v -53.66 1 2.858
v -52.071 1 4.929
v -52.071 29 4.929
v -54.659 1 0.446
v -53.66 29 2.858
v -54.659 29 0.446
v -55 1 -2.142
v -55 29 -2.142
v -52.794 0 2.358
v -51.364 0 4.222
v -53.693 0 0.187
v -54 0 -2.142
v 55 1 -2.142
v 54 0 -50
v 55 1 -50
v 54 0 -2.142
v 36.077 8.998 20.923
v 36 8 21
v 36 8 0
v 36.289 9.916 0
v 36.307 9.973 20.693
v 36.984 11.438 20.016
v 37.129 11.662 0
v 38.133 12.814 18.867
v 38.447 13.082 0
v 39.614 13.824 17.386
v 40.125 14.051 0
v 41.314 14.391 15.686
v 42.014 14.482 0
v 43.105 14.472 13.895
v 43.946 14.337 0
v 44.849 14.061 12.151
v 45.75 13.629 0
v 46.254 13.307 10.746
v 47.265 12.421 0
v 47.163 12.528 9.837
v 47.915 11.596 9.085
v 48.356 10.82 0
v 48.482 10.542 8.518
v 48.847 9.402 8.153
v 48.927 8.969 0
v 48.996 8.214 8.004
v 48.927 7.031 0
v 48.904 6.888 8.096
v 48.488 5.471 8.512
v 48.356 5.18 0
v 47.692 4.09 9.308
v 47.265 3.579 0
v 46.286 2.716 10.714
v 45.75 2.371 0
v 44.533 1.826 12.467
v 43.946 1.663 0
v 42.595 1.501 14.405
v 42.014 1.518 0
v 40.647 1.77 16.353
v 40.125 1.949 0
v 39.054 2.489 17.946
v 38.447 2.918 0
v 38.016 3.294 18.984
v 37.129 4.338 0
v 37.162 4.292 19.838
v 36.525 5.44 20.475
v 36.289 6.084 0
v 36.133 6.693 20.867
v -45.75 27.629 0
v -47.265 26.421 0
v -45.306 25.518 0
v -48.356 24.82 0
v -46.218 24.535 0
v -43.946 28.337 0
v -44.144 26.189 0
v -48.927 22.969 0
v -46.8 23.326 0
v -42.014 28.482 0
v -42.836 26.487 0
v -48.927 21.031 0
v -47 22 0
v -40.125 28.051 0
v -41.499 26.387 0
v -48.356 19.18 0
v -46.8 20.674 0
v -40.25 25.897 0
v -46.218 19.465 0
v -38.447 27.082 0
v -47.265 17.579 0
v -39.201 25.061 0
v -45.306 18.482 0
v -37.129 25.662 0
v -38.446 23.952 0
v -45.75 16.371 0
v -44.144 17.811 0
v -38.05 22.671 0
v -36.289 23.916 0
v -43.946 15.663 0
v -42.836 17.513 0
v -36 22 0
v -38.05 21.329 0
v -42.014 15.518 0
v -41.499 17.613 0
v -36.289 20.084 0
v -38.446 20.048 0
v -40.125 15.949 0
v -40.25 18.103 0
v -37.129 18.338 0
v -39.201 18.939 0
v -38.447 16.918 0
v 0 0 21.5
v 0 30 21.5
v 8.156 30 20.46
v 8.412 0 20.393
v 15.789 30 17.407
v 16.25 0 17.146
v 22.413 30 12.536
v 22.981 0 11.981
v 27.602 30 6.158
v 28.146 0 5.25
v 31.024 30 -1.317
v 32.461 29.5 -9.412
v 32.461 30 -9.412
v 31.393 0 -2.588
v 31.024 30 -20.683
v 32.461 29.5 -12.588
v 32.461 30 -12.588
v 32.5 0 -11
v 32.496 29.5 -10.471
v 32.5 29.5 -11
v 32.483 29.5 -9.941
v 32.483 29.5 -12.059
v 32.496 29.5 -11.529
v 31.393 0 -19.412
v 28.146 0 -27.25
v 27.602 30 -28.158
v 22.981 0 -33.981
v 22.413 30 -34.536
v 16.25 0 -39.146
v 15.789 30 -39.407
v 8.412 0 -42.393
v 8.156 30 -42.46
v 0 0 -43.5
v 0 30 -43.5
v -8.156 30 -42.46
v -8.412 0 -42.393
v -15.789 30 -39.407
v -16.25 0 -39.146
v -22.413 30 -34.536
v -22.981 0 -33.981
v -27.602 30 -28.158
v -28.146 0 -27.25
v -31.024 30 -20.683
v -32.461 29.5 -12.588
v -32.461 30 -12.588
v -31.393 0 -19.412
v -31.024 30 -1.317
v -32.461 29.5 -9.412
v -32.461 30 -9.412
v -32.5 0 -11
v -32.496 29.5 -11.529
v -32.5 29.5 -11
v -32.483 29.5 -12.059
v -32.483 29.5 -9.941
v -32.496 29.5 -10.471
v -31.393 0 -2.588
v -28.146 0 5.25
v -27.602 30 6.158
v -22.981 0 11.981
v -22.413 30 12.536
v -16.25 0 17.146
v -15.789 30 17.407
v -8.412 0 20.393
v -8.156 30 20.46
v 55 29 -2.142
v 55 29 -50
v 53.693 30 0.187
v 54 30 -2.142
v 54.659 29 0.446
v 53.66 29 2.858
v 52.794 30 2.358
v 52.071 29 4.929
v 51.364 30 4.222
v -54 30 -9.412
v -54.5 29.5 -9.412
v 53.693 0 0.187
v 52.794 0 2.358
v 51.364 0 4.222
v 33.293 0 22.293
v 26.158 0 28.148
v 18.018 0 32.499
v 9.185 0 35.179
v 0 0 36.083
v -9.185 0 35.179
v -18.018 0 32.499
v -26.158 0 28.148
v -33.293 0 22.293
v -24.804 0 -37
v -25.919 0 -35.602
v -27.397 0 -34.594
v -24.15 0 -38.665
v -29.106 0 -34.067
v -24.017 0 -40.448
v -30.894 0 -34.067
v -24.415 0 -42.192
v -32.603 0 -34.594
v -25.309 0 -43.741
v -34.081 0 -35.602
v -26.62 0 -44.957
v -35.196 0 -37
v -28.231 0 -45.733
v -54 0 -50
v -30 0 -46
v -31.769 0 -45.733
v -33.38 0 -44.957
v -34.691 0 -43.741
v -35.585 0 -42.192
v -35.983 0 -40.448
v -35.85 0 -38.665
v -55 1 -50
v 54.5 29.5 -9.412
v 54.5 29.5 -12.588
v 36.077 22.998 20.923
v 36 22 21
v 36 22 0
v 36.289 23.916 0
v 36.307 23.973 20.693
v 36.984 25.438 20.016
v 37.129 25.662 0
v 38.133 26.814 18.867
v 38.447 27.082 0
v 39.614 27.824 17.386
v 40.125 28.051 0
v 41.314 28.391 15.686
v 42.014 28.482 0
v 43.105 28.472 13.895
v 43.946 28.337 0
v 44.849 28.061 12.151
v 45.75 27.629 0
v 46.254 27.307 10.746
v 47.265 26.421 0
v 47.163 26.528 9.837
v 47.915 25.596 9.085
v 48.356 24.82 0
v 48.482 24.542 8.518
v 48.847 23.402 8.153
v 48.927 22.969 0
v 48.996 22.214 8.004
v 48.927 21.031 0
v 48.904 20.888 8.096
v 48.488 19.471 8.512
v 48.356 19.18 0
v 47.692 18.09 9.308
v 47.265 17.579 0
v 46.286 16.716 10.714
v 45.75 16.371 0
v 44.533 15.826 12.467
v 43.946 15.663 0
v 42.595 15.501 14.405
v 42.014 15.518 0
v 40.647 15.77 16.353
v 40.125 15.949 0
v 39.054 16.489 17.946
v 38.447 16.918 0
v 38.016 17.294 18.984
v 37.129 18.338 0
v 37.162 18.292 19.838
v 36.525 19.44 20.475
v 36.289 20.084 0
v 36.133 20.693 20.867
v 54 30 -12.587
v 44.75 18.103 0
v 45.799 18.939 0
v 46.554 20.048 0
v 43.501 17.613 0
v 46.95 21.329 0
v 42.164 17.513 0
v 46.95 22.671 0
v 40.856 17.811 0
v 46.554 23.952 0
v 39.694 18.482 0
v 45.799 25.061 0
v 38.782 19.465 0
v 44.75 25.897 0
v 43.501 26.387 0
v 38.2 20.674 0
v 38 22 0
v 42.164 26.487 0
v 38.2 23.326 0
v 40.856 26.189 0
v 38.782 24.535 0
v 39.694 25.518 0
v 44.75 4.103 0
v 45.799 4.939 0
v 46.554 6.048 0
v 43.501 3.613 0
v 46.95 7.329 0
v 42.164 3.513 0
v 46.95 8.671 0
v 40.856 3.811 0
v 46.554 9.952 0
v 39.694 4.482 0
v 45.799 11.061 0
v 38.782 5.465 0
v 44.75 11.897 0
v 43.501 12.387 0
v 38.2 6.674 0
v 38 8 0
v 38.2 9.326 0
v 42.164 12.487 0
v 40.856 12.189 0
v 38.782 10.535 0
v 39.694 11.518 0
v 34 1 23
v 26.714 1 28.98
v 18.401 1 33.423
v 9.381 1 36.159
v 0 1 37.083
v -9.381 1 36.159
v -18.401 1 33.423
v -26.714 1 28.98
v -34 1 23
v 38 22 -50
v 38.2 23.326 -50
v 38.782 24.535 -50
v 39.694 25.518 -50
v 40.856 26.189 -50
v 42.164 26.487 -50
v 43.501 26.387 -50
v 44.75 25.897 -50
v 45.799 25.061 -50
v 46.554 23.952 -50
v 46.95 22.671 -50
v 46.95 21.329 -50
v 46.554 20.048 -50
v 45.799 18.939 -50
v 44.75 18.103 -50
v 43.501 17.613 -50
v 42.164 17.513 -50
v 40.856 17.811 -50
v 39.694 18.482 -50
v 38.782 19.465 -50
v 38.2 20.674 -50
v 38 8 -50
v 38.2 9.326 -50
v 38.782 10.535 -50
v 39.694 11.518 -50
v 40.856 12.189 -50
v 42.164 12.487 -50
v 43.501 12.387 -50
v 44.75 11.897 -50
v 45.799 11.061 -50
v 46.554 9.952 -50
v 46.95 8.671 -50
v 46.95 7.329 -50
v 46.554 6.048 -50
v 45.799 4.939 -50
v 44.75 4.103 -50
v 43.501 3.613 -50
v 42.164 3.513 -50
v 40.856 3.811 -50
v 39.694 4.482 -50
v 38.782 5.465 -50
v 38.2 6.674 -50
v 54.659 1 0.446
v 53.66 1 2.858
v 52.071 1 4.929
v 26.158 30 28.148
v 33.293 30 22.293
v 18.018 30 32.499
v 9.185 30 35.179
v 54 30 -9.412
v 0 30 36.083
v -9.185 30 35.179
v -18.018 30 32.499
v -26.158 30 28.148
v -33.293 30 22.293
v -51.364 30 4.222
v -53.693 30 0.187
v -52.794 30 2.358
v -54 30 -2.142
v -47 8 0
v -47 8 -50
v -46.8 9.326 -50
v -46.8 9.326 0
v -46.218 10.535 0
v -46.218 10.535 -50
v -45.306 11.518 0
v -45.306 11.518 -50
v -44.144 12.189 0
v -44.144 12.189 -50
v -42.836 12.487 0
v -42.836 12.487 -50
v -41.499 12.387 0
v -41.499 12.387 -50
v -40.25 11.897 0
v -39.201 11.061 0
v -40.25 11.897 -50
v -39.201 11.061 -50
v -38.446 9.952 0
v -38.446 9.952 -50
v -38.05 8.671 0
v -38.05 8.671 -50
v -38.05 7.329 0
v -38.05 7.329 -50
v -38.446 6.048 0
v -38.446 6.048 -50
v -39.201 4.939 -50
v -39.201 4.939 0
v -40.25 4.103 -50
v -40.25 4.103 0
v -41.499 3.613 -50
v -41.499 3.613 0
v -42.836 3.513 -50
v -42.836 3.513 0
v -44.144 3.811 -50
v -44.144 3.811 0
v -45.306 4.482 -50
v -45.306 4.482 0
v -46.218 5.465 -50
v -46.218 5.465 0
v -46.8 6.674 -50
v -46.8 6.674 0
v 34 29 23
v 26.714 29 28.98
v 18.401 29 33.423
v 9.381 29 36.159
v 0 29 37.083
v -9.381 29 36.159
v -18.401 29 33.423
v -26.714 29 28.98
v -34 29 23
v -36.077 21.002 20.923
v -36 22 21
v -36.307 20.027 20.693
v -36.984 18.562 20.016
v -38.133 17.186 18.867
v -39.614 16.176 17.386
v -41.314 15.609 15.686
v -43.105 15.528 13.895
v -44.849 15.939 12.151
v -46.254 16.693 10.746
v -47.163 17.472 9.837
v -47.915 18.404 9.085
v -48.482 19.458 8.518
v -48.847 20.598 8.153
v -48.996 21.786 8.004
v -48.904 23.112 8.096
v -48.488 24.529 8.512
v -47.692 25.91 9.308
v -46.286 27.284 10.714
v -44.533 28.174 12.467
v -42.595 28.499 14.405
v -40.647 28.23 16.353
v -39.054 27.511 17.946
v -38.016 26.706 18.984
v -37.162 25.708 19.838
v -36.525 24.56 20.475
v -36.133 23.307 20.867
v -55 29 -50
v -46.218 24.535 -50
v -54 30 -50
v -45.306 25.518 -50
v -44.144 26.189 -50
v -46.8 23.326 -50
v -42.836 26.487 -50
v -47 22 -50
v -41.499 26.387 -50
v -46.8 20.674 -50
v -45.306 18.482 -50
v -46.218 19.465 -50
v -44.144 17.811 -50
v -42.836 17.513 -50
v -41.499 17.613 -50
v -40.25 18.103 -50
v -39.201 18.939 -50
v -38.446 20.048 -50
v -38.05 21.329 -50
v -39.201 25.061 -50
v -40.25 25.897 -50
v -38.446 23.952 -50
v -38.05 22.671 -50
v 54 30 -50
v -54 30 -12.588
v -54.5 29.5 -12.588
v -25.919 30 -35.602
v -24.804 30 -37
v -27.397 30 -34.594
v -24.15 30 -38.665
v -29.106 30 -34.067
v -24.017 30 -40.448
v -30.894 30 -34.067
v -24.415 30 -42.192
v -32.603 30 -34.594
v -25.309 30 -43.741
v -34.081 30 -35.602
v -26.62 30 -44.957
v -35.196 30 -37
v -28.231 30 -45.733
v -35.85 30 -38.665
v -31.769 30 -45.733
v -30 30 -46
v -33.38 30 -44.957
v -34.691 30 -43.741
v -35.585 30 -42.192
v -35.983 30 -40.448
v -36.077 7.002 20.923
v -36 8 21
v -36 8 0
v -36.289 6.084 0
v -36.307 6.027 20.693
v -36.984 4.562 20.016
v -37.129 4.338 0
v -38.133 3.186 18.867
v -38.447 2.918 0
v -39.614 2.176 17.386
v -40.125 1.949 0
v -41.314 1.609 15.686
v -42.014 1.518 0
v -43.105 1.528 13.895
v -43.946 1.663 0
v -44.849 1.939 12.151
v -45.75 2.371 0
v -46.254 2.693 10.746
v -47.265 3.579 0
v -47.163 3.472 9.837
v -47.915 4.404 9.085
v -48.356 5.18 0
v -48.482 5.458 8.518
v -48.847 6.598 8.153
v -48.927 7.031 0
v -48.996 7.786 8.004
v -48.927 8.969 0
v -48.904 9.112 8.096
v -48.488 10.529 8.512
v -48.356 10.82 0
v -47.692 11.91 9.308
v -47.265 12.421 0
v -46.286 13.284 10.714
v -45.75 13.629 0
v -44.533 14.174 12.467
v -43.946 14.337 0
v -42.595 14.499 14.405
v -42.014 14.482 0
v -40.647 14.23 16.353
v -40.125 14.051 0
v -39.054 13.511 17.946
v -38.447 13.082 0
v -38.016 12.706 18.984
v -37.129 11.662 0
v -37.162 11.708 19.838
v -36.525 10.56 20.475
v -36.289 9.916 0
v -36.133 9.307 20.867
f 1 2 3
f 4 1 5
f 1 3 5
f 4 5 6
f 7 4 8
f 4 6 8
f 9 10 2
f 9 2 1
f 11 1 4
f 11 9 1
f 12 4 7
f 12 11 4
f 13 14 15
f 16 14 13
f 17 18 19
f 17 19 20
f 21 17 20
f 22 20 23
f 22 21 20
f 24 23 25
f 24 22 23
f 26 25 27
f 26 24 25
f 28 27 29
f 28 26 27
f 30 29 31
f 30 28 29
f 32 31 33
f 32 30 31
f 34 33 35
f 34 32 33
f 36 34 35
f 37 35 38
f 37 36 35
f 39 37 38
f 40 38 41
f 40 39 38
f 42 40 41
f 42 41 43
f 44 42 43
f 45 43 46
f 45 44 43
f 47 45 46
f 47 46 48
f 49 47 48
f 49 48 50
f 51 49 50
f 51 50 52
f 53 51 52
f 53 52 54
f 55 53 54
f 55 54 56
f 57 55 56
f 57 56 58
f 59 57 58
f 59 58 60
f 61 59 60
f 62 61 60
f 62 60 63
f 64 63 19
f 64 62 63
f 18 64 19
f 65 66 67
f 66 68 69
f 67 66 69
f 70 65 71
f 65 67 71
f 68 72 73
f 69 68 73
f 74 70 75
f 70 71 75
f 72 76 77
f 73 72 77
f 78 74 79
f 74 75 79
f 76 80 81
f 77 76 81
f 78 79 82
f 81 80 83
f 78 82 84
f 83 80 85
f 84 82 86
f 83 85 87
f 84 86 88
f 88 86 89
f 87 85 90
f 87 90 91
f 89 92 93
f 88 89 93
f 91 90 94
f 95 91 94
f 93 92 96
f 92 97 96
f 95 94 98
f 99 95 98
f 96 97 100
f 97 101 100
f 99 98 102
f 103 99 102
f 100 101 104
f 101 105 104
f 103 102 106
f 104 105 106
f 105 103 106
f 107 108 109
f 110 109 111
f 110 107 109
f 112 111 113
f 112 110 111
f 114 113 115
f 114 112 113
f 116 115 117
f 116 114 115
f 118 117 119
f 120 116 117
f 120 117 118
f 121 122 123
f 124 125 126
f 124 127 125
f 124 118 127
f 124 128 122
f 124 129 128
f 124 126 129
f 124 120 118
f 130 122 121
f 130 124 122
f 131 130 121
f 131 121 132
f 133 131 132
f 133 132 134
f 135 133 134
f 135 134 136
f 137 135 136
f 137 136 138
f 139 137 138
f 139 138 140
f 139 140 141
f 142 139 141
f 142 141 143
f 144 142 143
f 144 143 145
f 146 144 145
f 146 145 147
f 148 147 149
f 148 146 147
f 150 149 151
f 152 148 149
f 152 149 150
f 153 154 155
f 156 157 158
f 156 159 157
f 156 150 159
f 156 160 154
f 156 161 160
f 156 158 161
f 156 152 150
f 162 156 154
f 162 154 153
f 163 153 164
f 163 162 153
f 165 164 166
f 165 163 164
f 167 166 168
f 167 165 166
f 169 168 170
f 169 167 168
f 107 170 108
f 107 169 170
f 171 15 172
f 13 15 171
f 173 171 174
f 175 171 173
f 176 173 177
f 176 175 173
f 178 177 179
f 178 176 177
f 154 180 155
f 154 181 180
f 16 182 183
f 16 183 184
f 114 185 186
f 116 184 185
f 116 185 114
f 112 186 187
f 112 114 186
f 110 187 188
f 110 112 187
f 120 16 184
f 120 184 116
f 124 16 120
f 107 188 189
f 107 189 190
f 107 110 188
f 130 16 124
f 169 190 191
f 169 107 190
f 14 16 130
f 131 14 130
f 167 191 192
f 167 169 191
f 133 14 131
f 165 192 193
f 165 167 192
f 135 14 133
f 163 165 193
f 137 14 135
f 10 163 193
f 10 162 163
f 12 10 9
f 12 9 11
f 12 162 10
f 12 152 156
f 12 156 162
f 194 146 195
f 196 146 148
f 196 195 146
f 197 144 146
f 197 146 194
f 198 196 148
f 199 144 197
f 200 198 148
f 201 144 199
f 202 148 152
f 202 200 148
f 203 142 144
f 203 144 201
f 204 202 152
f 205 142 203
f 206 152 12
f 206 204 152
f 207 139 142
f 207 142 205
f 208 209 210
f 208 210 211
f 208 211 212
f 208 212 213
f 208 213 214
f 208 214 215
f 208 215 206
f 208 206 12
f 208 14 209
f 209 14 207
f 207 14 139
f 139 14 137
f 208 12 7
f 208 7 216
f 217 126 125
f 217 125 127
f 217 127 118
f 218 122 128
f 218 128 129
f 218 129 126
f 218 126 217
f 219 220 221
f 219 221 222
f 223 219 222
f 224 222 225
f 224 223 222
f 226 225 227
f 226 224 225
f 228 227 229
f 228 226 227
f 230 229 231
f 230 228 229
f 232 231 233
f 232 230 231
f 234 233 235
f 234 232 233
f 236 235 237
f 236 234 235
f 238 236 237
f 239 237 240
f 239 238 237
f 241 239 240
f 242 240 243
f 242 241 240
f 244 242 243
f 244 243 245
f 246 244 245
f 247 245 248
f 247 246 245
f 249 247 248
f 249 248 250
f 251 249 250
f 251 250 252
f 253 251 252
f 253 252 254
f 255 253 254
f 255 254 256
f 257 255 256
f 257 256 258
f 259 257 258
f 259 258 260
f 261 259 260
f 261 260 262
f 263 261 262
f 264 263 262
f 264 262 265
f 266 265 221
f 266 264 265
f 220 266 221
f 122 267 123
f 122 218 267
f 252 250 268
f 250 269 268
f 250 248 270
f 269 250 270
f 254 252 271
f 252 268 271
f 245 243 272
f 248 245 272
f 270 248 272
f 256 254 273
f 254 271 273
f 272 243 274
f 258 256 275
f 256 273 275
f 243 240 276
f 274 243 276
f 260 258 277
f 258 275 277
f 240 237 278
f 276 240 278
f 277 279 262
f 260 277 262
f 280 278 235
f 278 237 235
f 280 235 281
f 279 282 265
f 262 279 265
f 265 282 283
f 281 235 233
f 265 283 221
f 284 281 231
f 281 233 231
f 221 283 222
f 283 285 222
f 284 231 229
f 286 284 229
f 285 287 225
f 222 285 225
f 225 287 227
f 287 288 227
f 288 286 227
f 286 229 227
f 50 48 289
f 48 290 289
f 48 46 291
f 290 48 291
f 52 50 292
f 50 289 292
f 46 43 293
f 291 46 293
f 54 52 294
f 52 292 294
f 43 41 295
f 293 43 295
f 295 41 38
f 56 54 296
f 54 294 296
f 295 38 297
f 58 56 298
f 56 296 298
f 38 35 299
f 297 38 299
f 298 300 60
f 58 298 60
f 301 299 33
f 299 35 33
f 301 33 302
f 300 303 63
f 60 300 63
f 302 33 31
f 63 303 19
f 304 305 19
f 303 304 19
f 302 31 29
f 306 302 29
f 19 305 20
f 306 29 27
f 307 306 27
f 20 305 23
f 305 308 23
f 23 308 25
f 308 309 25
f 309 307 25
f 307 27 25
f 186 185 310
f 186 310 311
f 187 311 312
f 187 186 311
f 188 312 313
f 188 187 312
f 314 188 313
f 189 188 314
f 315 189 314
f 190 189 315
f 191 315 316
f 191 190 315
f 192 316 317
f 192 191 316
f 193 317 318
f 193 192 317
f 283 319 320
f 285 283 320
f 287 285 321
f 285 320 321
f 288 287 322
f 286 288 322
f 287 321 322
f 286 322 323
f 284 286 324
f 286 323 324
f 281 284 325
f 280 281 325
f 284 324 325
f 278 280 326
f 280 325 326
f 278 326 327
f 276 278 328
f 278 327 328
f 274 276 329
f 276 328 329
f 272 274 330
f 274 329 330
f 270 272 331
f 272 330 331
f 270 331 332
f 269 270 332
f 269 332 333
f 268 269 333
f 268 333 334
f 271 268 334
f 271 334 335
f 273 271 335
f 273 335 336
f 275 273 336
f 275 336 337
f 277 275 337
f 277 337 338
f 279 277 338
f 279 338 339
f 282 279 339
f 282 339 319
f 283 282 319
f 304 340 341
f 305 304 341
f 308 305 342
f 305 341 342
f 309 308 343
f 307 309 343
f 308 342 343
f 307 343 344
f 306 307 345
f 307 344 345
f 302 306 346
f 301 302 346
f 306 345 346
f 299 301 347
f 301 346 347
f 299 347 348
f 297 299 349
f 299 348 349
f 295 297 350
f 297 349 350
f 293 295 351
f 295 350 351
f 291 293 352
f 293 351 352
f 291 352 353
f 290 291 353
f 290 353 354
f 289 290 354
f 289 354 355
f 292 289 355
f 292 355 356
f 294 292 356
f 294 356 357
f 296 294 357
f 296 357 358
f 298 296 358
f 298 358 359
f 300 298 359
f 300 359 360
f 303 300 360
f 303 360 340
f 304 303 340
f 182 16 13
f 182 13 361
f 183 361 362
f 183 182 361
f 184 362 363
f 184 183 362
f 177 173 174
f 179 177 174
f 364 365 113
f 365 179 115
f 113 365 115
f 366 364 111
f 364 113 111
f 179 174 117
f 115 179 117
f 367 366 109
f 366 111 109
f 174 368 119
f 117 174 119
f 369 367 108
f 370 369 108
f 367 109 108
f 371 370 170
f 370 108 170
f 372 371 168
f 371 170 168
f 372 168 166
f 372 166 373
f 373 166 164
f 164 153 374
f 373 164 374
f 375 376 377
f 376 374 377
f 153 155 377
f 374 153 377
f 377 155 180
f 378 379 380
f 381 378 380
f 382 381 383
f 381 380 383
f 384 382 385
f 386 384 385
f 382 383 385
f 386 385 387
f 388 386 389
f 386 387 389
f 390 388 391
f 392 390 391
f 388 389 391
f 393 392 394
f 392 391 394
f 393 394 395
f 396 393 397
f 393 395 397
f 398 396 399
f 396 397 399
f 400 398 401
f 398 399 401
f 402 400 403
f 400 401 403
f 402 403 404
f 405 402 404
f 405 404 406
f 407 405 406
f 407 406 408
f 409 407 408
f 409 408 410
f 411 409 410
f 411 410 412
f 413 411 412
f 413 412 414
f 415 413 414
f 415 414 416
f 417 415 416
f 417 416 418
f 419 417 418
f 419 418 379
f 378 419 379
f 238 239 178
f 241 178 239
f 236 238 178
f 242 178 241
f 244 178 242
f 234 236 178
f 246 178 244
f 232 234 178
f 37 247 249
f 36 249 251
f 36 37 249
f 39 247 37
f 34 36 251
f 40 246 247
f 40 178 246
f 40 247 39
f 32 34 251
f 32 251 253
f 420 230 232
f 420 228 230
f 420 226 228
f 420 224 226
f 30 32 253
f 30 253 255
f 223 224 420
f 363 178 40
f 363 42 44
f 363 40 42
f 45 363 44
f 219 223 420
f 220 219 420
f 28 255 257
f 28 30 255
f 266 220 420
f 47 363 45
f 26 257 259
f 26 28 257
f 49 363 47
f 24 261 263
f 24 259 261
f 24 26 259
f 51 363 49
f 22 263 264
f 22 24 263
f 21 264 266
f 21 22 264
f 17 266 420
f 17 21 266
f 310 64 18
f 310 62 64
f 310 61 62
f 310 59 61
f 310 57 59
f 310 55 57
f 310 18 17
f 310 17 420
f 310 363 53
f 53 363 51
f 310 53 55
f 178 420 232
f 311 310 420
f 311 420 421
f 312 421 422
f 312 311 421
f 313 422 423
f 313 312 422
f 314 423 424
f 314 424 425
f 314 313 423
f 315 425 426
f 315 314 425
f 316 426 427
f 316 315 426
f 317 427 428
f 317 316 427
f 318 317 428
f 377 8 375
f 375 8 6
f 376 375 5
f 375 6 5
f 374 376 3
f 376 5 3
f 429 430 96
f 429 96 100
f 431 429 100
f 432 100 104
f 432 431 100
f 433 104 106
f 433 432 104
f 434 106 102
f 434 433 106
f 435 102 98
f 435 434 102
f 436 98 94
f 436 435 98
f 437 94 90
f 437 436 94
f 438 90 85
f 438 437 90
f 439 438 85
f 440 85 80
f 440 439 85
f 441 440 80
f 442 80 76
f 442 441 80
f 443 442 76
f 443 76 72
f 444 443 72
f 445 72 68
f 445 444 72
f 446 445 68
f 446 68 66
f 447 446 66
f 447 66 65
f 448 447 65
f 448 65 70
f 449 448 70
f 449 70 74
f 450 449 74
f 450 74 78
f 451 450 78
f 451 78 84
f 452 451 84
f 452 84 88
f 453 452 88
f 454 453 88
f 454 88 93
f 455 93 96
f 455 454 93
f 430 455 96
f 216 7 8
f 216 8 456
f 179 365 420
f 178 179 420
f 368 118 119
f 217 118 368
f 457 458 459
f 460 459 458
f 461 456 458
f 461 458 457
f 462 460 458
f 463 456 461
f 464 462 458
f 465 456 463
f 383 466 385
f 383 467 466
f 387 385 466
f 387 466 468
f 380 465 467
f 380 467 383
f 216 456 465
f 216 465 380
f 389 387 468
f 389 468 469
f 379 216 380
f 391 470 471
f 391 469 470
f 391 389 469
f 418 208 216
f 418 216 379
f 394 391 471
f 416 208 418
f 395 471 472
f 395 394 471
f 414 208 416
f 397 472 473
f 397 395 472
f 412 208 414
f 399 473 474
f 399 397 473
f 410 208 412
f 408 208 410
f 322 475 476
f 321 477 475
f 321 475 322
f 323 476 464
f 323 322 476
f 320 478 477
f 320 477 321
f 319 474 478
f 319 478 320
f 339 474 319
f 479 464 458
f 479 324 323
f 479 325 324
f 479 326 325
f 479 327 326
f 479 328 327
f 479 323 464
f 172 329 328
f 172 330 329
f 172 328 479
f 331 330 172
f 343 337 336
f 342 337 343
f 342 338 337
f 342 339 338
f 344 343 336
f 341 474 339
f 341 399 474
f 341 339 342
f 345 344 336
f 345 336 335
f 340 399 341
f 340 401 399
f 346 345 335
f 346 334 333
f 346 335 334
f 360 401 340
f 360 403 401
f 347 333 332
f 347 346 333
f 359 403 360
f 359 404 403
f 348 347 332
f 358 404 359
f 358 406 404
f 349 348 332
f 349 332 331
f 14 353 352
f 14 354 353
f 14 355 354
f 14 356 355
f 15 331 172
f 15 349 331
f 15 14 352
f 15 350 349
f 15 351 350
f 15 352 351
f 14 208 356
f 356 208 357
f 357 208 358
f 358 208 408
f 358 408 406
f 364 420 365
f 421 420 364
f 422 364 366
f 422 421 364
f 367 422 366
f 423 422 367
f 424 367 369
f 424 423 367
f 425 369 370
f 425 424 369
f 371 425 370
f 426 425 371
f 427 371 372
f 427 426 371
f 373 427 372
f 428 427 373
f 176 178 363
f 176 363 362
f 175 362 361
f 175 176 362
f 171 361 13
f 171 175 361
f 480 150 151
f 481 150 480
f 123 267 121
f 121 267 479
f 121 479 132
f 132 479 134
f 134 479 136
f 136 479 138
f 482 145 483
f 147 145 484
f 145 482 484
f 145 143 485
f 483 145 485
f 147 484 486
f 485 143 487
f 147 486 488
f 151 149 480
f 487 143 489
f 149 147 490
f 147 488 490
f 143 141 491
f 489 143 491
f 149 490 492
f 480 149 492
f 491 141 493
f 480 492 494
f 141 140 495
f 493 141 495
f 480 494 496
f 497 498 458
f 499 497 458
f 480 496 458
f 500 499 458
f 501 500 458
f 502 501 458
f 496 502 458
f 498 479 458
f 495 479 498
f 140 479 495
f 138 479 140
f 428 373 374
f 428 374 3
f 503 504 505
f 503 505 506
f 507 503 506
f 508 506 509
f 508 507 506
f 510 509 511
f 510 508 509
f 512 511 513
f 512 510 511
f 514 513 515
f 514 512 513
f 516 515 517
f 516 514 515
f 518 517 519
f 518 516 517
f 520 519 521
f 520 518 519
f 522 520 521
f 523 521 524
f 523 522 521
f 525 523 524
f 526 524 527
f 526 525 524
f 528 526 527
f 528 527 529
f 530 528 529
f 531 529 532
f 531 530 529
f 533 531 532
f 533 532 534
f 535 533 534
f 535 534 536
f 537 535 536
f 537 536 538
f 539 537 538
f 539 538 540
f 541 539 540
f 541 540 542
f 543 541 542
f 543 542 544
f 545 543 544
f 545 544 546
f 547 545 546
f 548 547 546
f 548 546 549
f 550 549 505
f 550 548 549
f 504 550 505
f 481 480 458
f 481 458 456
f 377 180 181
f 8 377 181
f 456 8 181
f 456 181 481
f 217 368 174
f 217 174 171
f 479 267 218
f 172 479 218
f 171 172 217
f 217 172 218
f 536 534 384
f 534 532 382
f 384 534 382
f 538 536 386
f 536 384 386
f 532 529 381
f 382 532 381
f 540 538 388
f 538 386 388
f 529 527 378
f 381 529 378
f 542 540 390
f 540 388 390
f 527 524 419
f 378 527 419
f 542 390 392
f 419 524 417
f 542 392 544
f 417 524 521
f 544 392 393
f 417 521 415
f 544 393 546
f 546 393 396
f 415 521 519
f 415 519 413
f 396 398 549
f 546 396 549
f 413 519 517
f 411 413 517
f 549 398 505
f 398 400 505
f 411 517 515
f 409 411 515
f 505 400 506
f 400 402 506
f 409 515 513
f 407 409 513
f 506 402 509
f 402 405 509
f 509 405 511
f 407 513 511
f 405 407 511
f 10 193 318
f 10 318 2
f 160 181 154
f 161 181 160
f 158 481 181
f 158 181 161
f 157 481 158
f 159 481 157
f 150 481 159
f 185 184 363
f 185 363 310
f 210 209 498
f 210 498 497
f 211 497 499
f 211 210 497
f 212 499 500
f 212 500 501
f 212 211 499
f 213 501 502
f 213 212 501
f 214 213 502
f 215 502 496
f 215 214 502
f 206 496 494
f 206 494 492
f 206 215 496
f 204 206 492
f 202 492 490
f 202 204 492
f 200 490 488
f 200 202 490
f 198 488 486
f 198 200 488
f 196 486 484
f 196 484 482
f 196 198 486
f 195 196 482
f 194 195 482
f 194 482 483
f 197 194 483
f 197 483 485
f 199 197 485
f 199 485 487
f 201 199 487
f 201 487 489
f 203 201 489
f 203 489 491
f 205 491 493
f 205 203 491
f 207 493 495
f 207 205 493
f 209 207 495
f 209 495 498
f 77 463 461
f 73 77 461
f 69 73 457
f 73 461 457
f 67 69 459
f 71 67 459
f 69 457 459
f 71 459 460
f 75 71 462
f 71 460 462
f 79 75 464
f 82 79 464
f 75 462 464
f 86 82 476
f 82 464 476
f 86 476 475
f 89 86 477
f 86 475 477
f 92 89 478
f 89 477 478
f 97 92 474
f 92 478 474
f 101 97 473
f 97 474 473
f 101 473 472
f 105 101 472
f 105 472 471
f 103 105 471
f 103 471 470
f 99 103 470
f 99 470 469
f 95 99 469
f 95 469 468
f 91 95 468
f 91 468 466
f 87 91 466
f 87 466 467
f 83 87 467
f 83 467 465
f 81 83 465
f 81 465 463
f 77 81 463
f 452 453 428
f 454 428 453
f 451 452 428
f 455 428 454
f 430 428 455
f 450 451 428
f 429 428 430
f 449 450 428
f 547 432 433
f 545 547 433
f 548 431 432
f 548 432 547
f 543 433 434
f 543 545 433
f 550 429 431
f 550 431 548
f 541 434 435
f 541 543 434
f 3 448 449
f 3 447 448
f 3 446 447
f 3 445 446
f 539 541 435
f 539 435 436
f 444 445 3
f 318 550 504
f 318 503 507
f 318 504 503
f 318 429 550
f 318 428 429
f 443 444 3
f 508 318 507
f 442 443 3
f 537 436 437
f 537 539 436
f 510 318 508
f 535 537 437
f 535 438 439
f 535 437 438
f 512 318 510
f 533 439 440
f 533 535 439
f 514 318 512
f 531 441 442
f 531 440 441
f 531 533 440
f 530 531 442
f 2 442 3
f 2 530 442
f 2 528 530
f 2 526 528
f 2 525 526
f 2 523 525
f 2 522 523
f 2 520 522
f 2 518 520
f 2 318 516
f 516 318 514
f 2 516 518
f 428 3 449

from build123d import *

# Parameters (mm, degrees)
SKETCH1_R               = 32.5
SKETCH1_R_2             = 6
BOSS_EXTRUDE1_DEPTH     = 30
CUT_EXTRUDE1_START      = -0.5
CUT_EXTRUDE1_DEPTH      = 0.5
SKETCH3_R               = 4.5
CUT_EXTRUDE2_DEPTH      = 108.277650829
CUT_EXTRUDE3_DEPTH      = 10
CUT_EXTRUDE3_DEPTH_BACK = 25
SKETCH4_R               = 6.5
FILLET1_R               = 10
CHAMFER1_SIZE           = 1
CHAMFER2_SIZE           = 1


with BuildPart() as part:
    # Sketch1 → Boss-Extrude1 (new body)
    with BuildSketch(Plane(origin=(0, 0, 0), x_dir=(1, 0, 0), z_dir=(0, 1, 0))):
        with BuildLine():
            Line((-34, -23), (-55, -2))
            Line((-55, -2), (-55, 50))
            Line((-55, 50), (55, 50))
            Line((55, 50), (55, -2))
            Line((55, -2), (34, -23))
            ThreePointArc((34, -23), (0, -37.083261121), (-34, -23))
        make_face()
        with Locations((0, 11)):
            Circle(SKETCH1_R, mode=Mode.SUBTRACT)
        with Locations((-30, 40)):
            Circle(SKETCH1_R_2, mode=Mode.SUBTRACT)
    extrude(amount=BOSS_EXTRUDE1_DEPTH)

    # Sketch2 → Cut-Extrude1 (cut)
    with BuildSketch(Plane(origin=(0, 30, 0), x_dir=(1, 0, 0), z_dir=(0, 1, 0)).offset(CUT_EXTRUDE1_START)):
        with BuildLine():
            ThreePointArc((-32.461205211, 9.4125), (-32.5, 11), (-32.461205211, 12.5875))
            Line((-32.461205211, 12.5875), (-55, 12.5875))
            Line((-55, 12.5875), (-55, 9.4125))
            Line((-55, 9.4125), (-32.461205211, 9.4125))
        make_face()
        with BuildLine():
            ThreePointArc((32.461205211, 12.5875), (32.5, 11), (32.461205211, 9.4125))
            Line((32.461205211, 9.4125), (55, 9.4125))
            Line((55, 9.4125), (55, 12.5875))
            Line((55, 12.5875), (32.461205211, 12.5875))
        make_face()
    extrude(amount=CUT_EXTRUDE1_DEPTH, mode=Mode.SUBTRACT)

    # Sketch3 → Cut-Extrude2 (cut, through all)
    with BuildSketch(Plane(origin=(0, 0, -50), x_dir=(-1, 0, 0), z_dir=(0, 0, -1))):
        with Locations((42.5, 8)):
            Circle(SKETCH3_R)
        with Locations((-42.5, 8)):
            Circle(SKETCH3_R)
        with Locations((-42.5, 22)):
            Circle(SKETCH3_R)
        with Locations((42.5, 22)):
            Circle(SKETCH3_R)
    extrude(amount=-CUT_EXTRUDE2_DEPTH, mode=Mode.SUBTRACT)

    # Sketch4 → Cut-Extrude3 (cut, two sides: drawn at the far end of the back side and taken through both)
    with BuildSketch(Plane(origin=(0, 0, 10), x_dir=(-1, 0, 0), z_dir=(0, 0, -1)).offset(-CUT_EXTRUDE3_DEPTH_BACK)):
        with Locations((-42.5, 22)):
            Circle(SKETCH4_R)
        with Locations((-42.5, 8)):
            Circle(SKETCH4_R)
        with Locations((42.5, 8)):
            Circle(SKETCH4_R)
        with Locations((42.5, 22)):
            Circle(SKETCH4_R)
    extrude(amount=CUT_EXTRUDE3_DEPTH + CUT_EXTRUDE3_DEPTH_BACK, mode=Mode.SUBTRACT)

    # Fillet1
    fillet1_edges = [part.edges().sort_by_distance(p)[0] for p in [
        (-55, 15, 2),
        (55, 15, 2),
    ]]
    fillet(fillet1_edges, radius=FILLET1_R)

    # Chamfer1
    chamfer1_edges = [part.edges().sort_by_distance(p)[0] for p in [
        (43.035533906, 30, 13.964466094),
        (54.238795325, 30, 1.6846987),
        (0, 30, 37.083261121),
        (55, 30, -5.777317812),
        (-43.035533906, 30, 13.964466094),
        (-54.238795325, 30, 1.6846987),
        (-55, 30, -5.777317812),
    ]]
    chamfer(chamfer1_edges, length=CHAMFER1_SIZE)

    # Chamfer2
    chamfer2_edges = [part.edges().sort_by_distance(p)[0] for p in [
        (55, 0, -26.071067812),
        (43.035533906, 0, 13.964466094),
        (0, 0, 37.083261121),
        (-43.035533906, 0, 13.964466094),
        (-55, 0, -26.071067812),
        (54.238795325, 0, 1.6846987),
        (-54.238795325, 0, 1.6846987),
    ]]
    chamfer(chamfer2_edges, length=CHAMFER2_SIZE)


solid = part.part
